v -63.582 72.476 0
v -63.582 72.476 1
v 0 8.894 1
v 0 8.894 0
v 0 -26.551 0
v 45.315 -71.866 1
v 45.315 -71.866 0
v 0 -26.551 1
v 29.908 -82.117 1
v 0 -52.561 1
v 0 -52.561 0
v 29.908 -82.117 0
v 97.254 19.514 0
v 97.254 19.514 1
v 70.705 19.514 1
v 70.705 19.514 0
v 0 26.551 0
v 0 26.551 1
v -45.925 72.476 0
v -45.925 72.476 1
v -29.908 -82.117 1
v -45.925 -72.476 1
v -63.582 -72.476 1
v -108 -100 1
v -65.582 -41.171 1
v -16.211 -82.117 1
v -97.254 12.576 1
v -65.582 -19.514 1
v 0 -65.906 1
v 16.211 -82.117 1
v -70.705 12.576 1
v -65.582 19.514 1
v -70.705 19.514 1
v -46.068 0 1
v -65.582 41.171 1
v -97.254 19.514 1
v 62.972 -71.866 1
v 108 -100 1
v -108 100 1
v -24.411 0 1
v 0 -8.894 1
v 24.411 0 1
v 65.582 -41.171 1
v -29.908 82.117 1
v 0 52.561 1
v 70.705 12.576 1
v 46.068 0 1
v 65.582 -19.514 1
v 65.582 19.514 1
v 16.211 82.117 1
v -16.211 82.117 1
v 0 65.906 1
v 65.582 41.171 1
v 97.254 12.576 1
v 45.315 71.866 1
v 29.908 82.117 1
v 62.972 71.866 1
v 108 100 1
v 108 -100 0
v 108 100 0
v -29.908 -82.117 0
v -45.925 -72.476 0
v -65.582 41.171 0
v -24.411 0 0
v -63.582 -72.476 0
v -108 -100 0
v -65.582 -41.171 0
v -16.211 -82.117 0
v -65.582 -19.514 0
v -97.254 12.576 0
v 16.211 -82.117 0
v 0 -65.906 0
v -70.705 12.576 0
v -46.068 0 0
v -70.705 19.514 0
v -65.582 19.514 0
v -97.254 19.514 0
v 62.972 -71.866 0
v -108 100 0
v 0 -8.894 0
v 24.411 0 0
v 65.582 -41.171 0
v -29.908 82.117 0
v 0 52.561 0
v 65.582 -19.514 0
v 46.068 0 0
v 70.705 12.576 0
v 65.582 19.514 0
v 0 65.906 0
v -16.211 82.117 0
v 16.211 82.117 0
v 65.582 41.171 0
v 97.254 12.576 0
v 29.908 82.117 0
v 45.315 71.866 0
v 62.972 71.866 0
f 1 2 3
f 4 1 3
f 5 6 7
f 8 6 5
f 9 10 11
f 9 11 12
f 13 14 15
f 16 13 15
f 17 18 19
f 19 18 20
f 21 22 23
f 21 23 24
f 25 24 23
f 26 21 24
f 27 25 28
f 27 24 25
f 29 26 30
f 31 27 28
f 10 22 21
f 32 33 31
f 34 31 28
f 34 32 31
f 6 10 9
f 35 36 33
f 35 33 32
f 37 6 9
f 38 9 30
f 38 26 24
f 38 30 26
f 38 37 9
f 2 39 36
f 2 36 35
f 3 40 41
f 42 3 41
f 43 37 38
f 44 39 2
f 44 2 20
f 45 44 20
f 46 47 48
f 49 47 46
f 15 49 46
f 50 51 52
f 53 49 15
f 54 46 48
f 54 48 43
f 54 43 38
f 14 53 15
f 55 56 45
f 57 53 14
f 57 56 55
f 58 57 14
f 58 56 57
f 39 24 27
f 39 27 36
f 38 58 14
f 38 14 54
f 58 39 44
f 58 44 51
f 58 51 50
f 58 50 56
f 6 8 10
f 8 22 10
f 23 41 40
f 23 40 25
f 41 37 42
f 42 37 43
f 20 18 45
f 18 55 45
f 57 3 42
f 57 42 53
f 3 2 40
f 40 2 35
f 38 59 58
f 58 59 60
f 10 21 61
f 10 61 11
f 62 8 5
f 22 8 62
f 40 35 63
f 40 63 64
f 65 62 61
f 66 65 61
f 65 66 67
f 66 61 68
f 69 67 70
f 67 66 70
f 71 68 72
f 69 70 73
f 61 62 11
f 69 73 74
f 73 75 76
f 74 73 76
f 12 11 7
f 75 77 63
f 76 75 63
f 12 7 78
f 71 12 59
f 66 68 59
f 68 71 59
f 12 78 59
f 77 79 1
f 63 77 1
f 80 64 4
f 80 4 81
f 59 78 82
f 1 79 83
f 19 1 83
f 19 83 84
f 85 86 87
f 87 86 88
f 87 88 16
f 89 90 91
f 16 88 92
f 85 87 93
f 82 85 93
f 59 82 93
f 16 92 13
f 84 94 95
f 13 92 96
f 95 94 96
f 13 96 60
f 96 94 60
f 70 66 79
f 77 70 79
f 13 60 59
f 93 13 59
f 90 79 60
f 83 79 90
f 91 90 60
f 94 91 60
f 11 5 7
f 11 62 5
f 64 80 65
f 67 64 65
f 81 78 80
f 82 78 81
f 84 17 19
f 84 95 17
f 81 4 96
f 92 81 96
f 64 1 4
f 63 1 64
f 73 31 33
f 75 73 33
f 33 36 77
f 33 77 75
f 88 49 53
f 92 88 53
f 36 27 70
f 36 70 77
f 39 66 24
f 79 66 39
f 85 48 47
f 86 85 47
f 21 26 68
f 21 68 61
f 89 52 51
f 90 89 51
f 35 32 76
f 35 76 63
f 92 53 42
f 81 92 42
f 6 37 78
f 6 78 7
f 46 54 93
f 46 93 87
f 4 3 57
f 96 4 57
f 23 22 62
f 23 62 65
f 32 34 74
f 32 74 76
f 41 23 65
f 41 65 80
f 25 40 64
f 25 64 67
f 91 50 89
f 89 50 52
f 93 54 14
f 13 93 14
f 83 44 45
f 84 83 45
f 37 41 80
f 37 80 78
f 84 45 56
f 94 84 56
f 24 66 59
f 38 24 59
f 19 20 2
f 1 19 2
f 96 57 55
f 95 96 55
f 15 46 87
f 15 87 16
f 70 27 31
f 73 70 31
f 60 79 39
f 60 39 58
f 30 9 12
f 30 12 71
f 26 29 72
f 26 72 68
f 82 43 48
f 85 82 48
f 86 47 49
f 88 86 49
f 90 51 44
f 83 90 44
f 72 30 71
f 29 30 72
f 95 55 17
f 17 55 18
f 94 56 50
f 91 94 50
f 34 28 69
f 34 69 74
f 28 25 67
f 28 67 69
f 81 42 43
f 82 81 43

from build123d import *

# Parameters (mm, degrees)
SKETCH_1_W          = 216
SKETCH_1_H          = 200
EXTRUDE_1_DEPTH     = 1
CUT_EXTRUDE_2_DEPTH = 148.190352945
CUT_EXTRUDE_3_DEPTH = 148.190352945
SKETCH_4_W          = 26.549290854
SKETCH_4_H          = 6.938085034
CUT_EXTRUDE_4_DEPTH = 148.190352945


with BuildPart() as part:
    # 草图1 → 凸台-拉伸1 (new body)
    with BuildSketch(Plane.XY):
        Rectangle(SKETCH_1_W, SKETCH_1_H)
    extrude(amount=EXTRUDE_1_DEPTH)

    # 草图2 → 切除-拉伸2 (cut, through all)
    with BuildSketch(Plane.XY.offset(1)):
        Polygon((-29.908359309, 82.116750483), (0, 52.560653053), (29.908359309, 82.116750483), (16.210763117, 82.116750483), (0, 65.905987366), (-16.210763117, 82.116750483), align=None)
        Polygon((0, 26.550736561), (-45.925349273, 72.476085834), (-63.582203523, 72.476085834), (0, 8.893882312), (62.972238909, 71.866121221), (45.31538466, 71.866121221), align=None)
    cut_extrude_2 = extrude(amount=-CUT_EXTRUDE_2_DEPTH, mode=Mode.SUBTRACT)

    # 镜向2: 切除-拉伸2 across plane
    add(cut_extrude_2.mirror(Plane.ZX), mode=Mode.SUBTRACT)

    # 草图3 → 切除-拉伸3 (cut, through all)
    with BuildSketch(Plane.XY.offset(1)):
        Polygon((-46.068138611, 0), (-65.582203523, 19.514064912), (-65.582203523, 41.170919161), (-24.411284361, 0), (-65.582203523, -41.170919161), (-65.582203523, -19.514064912), align=None)
    cut_extrude_3 = extrude(amount=-CUT_EXTRUDE_3_DEPTH, mode=Mode.SUBTRACT)

    # 镜向3: 切除-拉伸3 across plane
    add(cut_extrude_3.mirror(Plane(origin=(0, 0, 0), x_dir=(0, 0, 1), z_dir=(1, 0, 0))), mode=Mode.SUBTRACT)

    # 草图4 → 切除-拉伸4 (cut, through all)
    with BuildSketch(Plane.XY.offset(1)):
        with Locations((-83.979598966, 16.045022395)):
            Rectangle(SKETCH_4_W, SKETCH_4_H)
    cut_extrude_4 = extrude(amount=-CUT_EXTRUDE_4_DEPTH, mode=Mode.SUBTRACT)

    # 镜向4: 切除-拉伸4 across plane
    add(cut_extrude_4.mirror(Plane(origin=(0, 0, 0), x_dir=(0, 0, 1), z_dir=(1, 0, 0))), mode=Mode.SUBTRACT)


solid = part.part
